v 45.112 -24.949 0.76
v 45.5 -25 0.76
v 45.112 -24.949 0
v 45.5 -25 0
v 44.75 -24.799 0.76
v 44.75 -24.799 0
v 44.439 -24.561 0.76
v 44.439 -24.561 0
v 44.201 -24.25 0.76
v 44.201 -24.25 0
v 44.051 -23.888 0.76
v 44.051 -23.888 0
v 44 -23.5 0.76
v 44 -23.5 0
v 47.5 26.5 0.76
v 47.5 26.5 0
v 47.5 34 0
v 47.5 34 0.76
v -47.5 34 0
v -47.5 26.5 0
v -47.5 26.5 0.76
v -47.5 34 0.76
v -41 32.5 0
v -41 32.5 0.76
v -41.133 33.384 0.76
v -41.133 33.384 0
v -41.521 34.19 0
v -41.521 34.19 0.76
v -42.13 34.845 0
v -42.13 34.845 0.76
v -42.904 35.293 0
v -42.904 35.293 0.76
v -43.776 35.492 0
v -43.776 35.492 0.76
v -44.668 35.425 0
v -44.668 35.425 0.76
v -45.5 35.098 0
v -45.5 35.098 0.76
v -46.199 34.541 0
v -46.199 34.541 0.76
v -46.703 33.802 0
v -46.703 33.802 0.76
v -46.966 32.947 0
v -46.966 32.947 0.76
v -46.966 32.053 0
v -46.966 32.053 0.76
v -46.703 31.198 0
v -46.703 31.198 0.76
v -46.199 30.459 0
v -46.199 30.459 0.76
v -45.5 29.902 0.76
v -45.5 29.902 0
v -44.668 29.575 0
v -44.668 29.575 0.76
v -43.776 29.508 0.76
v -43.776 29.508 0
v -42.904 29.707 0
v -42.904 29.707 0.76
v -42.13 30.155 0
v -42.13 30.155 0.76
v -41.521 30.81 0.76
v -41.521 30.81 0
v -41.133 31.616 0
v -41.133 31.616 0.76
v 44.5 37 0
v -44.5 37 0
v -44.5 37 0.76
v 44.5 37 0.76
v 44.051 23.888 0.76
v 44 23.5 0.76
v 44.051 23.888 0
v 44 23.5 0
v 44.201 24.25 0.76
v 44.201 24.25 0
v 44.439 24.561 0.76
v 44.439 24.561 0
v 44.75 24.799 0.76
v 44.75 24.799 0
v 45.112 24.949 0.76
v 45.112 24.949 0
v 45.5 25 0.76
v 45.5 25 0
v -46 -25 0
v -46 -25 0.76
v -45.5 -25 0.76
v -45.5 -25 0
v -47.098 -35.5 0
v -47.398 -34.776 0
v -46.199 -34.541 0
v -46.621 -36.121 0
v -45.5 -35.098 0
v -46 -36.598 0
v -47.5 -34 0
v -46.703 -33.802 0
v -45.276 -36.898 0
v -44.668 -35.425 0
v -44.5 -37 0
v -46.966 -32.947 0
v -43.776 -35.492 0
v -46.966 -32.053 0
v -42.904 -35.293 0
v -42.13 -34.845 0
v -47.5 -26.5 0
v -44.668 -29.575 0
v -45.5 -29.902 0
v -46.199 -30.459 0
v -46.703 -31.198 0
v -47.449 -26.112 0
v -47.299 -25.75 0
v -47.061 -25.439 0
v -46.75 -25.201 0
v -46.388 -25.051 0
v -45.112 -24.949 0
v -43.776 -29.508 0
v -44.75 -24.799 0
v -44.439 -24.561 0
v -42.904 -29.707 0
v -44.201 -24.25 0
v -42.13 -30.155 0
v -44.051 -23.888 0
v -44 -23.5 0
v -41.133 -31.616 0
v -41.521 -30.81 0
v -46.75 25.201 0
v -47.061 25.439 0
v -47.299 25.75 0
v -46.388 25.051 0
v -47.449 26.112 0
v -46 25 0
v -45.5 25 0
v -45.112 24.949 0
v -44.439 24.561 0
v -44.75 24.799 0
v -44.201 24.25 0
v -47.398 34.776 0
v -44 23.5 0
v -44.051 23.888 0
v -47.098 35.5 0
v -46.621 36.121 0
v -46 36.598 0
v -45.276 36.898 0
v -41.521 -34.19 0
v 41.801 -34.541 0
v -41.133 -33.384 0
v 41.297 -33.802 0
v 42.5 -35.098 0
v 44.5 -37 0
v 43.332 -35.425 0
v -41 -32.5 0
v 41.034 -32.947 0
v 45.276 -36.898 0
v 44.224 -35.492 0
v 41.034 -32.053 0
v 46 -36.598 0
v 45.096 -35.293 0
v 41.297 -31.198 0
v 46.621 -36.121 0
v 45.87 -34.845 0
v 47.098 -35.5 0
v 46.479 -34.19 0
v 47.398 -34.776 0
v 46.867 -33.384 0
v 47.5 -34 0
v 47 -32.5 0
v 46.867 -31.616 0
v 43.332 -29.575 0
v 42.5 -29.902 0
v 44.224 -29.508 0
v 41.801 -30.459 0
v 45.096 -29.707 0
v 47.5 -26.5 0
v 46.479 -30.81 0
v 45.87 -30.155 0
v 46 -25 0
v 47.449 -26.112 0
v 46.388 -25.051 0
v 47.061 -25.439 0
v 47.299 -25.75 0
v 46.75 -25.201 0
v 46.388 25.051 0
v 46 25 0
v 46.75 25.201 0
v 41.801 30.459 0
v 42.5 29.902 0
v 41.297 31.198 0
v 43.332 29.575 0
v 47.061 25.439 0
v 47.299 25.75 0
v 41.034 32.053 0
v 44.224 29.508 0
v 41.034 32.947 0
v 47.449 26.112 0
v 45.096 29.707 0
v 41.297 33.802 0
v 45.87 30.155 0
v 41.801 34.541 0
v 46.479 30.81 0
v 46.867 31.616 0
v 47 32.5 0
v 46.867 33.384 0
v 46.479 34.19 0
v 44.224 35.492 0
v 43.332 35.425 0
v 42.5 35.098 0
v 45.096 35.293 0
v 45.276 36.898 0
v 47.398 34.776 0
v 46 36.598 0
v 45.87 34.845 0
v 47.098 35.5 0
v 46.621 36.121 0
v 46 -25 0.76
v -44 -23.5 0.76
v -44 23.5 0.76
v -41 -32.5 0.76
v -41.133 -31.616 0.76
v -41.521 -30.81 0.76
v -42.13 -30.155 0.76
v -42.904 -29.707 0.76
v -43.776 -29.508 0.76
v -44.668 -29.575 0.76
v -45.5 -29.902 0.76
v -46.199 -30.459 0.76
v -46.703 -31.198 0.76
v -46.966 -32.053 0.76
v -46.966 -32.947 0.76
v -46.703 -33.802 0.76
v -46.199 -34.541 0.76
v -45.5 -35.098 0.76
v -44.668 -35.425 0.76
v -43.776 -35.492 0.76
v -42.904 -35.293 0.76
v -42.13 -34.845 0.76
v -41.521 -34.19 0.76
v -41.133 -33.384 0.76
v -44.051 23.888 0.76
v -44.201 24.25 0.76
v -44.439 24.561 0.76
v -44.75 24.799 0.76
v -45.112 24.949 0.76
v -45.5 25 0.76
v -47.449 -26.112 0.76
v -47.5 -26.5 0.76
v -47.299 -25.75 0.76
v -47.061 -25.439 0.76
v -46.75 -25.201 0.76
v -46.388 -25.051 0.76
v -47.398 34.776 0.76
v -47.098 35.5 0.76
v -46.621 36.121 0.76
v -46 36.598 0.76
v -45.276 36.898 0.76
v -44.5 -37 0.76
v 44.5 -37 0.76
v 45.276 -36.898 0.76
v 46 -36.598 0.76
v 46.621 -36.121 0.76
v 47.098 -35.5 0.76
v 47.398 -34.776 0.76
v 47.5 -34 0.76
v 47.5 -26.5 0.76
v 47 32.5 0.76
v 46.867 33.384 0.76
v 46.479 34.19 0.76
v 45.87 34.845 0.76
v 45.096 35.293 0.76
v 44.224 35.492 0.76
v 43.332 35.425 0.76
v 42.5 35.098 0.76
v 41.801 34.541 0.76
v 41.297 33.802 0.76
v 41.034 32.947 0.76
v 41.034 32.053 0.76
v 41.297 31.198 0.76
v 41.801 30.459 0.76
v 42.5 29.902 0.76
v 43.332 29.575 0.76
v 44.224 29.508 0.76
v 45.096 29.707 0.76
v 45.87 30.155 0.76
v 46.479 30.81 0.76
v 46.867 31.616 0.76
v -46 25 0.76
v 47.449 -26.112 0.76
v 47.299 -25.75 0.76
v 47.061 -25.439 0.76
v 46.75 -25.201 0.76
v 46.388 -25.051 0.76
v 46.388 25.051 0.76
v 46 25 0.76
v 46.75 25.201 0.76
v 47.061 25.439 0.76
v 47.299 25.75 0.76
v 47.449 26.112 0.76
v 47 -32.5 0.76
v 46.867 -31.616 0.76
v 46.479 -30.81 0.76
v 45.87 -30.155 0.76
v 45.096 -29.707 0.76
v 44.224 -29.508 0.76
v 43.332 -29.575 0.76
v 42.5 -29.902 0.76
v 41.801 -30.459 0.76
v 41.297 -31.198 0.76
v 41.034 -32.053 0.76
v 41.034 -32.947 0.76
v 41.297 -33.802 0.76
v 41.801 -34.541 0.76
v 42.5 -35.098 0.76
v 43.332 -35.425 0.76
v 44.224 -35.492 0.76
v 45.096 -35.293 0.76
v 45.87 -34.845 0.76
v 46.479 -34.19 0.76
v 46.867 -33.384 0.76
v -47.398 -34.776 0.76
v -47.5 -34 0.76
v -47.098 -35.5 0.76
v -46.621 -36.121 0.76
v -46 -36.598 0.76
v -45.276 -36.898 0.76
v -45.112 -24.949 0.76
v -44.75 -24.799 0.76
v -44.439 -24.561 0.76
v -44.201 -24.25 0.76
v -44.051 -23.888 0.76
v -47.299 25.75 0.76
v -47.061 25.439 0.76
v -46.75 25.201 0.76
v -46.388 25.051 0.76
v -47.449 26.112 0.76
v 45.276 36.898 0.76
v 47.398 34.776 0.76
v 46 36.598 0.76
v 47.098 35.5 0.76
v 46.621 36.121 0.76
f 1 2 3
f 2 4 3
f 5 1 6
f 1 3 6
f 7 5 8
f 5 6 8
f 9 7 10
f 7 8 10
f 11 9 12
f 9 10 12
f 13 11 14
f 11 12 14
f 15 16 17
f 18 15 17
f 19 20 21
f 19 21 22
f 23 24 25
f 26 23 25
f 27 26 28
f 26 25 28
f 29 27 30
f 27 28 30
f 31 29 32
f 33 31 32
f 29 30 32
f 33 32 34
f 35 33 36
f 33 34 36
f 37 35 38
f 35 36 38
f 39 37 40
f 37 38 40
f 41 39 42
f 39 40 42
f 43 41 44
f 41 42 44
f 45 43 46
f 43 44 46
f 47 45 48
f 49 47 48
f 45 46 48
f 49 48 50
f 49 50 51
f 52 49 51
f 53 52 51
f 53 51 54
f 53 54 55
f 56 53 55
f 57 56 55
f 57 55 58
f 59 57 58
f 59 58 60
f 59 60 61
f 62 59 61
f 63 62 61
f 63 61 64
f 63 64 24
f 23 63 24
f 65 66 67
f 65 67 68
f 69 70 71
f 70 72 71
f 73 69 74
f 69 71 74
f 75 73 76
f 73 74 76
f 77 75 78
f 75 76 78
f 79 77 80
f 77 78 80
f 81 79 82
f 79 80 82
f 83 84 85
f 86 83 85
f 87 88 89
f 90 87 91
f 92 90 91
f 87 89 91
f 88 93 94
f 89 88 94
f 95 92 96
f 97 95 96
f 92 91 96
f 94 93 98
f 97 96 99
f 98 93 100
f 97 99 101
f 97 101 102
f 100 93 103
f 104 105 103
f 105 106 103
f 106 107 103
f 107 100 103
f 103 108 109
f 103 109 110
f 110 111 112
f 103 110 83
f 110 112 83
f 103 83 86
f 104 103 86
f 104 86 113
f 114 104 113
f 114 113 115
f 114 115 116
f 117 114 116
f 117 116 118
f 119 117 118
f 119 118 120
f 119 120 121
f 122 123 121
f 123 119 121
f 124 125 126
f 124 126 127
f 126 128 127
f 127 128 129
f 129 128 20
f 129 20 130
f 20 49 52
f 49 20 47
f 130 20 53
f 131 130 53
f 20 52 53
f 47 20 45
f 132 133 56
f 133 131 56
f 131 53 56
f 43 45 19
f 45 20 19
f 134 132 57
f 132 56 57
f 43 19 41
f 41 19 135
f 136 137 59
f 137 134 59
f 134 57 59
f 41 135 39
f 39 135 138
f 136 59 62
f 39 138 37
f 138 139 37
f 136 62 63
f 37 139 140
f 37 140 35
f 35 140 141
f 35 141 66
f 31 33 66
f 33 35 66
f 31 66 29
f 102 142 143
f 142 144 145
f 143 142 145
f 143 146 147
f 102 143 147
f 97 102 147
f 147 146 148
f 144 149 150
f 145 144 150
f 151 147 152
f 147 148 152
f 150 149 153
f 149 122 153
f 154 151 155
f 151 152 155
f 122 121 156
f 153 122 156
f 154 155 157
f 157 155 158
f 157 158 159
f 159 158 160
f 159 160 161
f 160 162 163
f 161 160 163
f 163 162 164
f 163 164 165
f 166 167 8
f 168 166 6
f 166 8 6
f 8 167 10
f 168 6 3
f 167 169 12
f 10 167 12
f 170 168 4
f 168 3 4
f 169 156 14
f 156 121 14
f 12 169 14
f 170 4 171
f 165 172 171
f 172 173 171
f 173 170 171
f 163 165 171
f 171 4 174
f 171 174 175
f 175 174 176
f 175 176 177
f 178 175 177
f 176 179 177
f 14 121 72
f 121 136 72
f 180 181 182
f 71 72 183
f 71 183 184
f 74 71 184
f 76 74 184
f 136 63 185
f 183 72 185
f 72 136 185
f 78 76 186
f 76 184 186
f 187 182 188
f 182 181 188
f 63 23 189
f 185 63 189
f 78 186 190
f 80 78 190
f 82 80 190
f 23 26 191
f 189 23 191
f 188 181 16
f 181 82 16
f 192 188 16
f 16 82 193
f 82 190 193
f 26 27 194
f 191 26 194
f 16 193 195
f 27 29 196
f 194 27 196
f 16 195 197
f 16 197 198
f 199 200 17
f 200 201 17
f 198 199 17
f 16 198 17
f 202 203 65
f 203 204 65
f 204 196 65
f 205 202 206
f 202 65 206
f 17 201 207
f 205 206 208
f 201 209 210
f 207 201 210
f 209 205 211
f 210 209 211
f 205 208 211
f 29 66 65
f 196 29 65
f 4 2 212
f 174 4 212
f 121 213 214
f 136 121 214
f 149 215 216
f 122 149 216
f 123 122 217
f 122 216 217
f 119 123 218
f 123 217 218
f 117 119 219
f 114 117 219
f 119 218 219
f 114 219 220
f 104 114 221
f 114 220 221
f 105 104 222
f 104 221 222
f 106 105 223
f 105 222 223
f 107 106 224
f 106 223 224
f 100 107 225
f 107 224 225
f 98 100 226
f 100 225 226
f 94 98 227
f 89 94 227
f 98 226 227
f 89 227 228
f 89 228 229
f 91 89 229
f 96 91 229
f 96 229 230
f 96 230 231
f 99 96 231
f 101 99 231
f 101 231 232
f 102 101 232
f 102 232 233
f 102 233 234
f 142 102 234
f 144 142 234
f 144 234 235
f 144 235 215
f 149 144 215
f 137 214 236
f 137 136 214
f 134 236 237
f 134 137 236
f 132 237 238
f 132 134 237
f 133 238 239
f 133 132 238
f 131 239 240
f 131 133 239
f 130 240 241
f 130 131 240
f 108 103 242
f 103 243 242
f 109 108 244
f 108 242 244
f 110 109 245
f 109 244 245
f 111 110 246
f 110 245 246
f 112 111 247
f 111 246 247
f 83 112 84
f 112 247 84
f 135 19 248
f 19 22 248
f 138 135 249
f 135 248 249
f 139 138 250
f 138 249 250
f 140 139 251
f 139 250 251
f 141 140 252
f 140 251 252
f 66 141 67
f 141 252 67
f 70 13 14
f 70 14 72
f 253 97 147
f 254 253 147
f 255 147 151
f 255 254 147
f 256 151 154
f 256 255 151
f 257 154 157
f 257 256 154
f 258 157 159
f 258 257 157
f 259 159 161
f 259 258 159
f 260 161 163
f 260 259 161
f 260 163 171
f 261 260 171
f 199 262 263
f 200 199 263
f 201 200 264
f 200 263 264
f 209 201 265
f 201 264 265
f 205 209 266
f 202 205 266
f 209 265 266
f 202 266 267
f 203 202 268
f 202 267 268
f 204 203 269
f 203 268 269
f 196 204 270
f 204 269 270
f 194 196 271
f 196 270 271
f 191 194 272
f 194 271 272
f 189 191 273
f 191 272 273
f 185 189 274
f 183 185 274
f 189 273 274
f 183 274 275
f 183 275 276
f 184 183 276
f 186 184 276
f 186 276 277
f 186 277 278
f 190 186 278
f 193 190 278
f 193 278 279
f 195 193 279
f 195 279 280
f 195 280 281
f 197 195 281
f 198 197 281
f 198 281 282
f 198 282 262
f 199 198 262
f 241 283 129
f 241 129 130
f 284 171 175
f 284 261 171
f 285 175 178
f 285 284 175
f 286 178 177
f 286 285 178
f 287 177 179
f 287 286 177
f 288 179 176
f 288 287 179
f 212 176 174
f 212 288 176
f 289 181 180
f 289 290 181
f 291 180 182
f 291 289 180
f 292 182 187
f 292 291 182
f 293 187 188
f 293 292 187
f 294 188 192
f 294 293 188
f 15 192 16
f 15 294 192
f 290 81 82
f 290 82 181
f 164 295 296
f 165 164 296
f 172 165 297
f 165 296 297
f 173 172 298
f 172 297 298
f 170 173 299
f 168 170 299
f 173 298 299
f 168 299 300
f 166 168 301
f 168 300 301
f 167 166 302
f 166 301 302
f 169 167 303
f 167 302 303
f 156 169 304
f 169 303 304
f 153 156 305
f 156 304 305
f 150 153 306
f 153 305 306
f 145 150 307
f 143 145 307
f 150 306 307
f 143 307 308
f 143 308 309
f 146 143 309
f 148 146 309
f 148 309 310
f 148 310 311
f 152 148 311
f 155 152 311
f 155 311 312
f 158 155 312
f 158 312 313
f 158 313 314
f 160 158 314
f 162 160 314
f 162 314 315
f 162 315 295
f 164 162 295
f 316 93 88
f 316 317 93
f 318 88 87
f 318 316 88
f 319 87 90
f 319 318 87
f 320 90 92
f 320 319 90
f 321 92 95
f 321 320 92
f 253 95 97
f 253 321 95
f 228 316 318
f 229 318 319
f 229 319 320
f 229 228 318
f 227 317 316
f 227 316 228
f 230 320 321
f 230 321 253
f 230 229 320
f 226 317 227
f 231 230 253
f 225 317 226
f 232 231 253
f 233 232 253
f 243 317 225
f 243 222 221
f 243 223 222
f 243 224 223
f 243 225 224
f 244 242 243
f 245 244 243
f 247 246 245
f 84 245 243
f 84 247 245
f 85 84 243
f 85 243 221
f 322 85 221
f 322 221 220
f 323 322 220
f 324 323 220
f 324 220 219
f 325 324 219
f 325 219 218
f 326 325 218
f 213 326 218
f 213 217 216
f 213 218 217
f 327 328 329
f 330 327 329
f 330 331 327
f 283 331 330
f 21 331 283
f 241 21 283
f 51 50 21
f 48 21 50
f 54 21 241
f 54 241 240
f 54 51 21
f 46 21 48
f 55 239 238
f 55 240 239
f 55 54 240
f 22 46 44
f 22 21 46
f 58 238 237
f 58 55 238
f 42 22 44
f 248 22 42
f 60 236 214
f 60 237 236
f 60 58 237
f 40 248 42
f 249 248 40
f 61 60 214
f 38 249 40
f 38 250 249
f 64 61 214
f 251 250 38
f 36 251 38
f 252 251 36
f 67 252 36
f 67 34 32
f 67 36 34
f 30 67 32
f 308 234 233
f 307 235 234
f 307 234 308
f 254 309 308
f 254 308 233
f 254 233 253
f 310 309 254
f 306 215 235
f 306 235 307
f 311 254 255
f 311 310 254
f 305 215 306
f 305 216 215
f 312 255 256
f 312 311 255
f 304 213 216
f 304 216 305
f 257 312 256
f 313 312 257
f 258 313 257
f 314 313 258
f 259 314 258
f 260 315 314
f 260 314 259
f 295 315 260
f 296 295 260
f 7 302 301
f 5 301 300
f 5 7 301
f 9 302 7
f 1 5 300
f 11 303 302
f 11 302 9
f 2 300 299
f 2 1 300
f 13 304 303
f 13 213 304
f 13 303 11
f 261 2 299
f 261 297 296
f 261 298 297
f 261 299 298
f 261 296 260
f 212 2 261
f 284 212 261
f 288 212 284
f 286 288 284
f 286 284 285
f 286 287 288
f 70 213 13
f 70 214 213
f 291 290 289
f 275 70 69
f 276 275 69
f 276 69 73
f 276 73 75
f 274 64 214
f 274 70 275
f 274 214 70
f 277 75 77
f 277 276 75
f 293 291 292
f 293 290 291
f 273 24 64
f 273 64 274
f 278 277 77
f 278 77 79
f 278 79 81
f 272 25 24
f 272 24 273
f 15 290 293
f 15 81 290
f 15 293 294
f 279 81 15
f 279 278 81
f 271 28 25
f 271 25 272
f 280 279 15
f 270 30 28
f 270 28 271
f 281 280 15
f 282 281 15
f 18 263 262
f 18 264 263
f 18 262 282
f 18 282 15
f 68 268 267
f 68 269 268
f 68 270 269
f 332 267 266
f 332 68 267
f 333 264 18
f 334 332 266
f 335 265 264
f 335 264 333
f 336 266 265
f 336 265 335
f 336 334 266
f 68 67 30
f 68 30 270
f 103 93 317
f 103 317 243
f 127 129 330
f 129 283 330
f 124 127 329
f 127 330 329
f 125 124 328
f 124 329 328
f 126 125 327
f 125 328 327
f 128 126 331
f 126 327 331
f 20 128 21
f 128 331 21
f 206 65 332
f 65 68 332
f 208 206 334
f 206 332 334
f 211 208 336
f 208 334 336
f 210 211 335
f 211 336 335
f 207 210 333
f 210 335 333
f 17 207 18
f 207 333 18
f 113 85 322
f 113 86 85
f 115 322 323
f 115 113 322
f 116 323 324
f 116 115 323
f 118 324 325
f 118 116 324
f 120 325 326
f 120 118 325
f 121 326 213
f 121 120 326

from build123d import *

# Parameters (mm, degrees)
SKETCH_W     = 95
SKETCH_H     = 74
PAD_DEPTH    = 0.76
SKETCH001_R  = 3
SKETCH001_W  = 20
SKETCH001_H  = 50
POCKET_DEPTH = 5
FILLET_R     = 3
FILLET001_R  = 1.5


with BuildPart() as part:
    # Sketch → Pad (new body)
    with BuildSketch(Plane.XY):
        Rectangle(SKETCH_W, SKETCH_H)
    extrude(amount=PAD_DEPTH)

    # Sketch001 → Pocket (cut)
    with BuildSketch(Plane.XY.offset(0.76)):
        with Locations((-44, 32.5)):
            Circle(SKETCH001_R)
        with Locations((44, 32.5)):
            Circle(SKETCH001_R)
        with Locations((44, -32.5)):
            Circle(SKETCH001_R)
        with Locations((-44, -32.5)):
            Circle(SKETCH001_R)
        with Locations((54, 0)):
            Rectangle(SKETCH001_W, SKETCH001_H)
        with Locations((-54, 0)):
            Rectangle(SKETCH001_W, SKETCH001_H)
    extrude(amount=-POCKET_DEPTH, mode=Mode.SUBTRACT)

    # Fillet
    fillet_edges = [part.edges().sort_by_distance(p)[0] for p in [
        (-47.5, 37, 0.38),
        (47.5, 37, 0.38),
        (47.5, -37, 0.38),
        (-47.5, -37, 0.38),
    ]]
    fillet(fillet_edges, radius=FILLET_R)

    # Fillet001
    fillet001_edges = [part.edges().sort_by_distance(p)[0] for p in [
        (47.5, -25, 0.38),
        (44, -25, 0.38),
        (44, 25, 0.38),
        (47.5, 25, 0.38),
        (-44, 25, 0.38),
        (-47.5, 25, 0.38),
        (-44, -25, 0.38),
        (-47.5, -25, 0.38),
    ]]
    fillet(fillet001_edges, radius=FILLET001_R)


solid = part.part
